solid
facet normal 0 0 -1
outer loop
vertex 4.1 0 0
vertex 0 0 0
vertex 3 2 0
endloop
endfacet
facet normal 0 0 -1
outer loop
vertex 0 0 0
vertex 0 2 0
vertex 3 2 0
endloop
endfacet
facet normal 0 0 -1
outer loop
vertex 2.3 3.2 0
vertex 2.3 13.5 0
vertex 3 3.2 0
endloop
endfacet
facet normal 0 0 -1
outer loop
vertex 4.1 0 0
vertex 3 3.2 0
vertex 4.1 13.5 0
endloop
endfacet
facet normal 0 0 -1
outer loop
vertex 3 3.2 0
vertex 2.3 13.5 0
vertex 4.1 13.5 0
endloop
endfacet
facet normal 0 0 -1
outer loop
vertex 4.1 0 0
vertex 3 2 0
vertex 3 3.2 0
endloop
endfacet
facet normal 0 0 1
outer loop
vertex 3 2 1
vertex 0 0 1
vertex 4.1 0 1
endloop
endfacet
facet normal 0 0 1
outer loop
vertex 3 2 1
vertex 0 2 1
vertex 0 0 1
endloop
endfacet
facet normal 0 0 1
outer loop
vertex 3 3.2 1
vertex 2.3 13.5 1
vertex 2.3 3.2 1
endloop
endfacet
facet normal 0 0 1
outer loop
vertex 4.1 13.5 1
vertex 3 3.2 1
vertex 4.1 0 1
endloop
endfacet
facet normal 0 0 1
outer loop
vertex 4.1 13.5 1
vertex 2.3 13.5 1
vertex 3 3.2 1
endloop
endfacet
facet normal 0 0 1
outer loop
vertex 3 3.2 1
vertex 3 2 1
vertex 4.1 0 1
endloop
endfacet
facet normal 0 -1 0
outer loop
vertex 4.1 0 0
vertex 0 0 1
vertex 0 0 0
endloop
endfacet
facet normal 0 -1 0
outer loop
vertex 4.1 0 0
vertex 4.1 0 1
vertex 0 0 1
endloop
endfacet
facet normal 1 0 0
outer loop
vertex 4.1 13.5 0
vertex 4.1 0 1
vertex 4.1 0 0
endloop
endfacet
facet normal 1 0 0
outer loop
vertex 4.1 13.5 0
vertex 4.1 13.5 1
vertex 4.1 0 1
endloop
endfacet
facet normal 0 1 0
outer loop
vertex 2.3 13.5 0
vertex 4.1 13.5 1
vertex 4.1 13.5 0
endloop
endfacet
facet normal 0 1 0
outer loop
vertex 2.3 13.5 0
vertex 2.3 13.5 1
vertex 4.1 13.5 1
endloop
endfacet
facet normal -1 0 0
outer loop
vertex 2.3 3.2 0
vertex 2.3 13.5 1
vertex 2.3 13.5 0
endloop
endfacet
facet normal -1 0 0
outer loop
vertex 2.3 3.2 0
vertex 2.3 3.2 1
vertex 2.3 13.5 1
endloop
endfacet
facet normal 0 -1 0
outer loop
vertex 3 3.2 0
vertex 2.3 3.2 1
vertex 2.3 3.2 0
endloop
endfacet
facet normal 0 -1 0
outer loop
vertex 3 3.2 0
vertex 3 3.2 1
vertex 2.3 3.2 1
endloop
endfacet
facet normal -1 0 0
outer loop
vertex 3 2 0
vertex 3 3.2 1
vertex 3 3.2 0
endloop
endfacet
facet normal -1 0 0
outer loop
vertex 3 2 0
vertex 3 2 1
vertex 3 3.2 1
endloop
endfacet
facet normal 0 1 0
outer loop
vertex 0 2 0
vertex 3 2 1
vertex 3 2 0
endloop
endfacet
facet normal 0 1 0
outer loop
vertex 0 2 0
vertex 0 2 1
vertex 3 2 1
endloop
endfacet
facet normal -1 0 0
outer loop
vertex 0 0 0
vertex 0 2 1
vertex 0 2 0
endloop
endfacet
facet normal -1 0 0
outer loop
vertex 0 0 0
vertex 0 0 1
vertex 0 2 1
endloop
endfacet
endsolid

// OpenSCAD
// file: bezel_bottom.scad
// ============================================================
// Front Bezel - Bottom Side (mitered 45° corners)
// Bottom has large lip (10.3mm) over the display's 11.3mm
// inactive area, with narrow channel (1.2mm) for thin rim.
// Side channels at corners remain open for left/right rims.
// ============================================================
include <common.scad>

module bezel_bottom() {
    bezel_side("bottom");
}

bezel_bottom();
// main file
// ============================================================
// Debug: Bottom bezel cross-section profile
//
// Shows a 2D cross-section cut through the middle of the
// bottom bezel (at X = frame_w/2), projected onto the YZ plane.
//
// Y axis = bezel width direction (outer edge → window)
// X axis = depth direction (back → front)
//
// Expected profile (bottom to top):
//   outer_wall (2mm, full height) | channel (1.2mm, full depth) | lip (10.3mm, 0.3mm thick)
//   With bezel face (2.4mm) on top of the lip zone
// ============================================================
include <common.scad>
use <bezel_bottom.scad>

linear_extrude(1)
projection(cut = true)
    rotate([0, 90, 0])
        translate([-frame_w / 2, 0, 0])
            bezel_bottom();
